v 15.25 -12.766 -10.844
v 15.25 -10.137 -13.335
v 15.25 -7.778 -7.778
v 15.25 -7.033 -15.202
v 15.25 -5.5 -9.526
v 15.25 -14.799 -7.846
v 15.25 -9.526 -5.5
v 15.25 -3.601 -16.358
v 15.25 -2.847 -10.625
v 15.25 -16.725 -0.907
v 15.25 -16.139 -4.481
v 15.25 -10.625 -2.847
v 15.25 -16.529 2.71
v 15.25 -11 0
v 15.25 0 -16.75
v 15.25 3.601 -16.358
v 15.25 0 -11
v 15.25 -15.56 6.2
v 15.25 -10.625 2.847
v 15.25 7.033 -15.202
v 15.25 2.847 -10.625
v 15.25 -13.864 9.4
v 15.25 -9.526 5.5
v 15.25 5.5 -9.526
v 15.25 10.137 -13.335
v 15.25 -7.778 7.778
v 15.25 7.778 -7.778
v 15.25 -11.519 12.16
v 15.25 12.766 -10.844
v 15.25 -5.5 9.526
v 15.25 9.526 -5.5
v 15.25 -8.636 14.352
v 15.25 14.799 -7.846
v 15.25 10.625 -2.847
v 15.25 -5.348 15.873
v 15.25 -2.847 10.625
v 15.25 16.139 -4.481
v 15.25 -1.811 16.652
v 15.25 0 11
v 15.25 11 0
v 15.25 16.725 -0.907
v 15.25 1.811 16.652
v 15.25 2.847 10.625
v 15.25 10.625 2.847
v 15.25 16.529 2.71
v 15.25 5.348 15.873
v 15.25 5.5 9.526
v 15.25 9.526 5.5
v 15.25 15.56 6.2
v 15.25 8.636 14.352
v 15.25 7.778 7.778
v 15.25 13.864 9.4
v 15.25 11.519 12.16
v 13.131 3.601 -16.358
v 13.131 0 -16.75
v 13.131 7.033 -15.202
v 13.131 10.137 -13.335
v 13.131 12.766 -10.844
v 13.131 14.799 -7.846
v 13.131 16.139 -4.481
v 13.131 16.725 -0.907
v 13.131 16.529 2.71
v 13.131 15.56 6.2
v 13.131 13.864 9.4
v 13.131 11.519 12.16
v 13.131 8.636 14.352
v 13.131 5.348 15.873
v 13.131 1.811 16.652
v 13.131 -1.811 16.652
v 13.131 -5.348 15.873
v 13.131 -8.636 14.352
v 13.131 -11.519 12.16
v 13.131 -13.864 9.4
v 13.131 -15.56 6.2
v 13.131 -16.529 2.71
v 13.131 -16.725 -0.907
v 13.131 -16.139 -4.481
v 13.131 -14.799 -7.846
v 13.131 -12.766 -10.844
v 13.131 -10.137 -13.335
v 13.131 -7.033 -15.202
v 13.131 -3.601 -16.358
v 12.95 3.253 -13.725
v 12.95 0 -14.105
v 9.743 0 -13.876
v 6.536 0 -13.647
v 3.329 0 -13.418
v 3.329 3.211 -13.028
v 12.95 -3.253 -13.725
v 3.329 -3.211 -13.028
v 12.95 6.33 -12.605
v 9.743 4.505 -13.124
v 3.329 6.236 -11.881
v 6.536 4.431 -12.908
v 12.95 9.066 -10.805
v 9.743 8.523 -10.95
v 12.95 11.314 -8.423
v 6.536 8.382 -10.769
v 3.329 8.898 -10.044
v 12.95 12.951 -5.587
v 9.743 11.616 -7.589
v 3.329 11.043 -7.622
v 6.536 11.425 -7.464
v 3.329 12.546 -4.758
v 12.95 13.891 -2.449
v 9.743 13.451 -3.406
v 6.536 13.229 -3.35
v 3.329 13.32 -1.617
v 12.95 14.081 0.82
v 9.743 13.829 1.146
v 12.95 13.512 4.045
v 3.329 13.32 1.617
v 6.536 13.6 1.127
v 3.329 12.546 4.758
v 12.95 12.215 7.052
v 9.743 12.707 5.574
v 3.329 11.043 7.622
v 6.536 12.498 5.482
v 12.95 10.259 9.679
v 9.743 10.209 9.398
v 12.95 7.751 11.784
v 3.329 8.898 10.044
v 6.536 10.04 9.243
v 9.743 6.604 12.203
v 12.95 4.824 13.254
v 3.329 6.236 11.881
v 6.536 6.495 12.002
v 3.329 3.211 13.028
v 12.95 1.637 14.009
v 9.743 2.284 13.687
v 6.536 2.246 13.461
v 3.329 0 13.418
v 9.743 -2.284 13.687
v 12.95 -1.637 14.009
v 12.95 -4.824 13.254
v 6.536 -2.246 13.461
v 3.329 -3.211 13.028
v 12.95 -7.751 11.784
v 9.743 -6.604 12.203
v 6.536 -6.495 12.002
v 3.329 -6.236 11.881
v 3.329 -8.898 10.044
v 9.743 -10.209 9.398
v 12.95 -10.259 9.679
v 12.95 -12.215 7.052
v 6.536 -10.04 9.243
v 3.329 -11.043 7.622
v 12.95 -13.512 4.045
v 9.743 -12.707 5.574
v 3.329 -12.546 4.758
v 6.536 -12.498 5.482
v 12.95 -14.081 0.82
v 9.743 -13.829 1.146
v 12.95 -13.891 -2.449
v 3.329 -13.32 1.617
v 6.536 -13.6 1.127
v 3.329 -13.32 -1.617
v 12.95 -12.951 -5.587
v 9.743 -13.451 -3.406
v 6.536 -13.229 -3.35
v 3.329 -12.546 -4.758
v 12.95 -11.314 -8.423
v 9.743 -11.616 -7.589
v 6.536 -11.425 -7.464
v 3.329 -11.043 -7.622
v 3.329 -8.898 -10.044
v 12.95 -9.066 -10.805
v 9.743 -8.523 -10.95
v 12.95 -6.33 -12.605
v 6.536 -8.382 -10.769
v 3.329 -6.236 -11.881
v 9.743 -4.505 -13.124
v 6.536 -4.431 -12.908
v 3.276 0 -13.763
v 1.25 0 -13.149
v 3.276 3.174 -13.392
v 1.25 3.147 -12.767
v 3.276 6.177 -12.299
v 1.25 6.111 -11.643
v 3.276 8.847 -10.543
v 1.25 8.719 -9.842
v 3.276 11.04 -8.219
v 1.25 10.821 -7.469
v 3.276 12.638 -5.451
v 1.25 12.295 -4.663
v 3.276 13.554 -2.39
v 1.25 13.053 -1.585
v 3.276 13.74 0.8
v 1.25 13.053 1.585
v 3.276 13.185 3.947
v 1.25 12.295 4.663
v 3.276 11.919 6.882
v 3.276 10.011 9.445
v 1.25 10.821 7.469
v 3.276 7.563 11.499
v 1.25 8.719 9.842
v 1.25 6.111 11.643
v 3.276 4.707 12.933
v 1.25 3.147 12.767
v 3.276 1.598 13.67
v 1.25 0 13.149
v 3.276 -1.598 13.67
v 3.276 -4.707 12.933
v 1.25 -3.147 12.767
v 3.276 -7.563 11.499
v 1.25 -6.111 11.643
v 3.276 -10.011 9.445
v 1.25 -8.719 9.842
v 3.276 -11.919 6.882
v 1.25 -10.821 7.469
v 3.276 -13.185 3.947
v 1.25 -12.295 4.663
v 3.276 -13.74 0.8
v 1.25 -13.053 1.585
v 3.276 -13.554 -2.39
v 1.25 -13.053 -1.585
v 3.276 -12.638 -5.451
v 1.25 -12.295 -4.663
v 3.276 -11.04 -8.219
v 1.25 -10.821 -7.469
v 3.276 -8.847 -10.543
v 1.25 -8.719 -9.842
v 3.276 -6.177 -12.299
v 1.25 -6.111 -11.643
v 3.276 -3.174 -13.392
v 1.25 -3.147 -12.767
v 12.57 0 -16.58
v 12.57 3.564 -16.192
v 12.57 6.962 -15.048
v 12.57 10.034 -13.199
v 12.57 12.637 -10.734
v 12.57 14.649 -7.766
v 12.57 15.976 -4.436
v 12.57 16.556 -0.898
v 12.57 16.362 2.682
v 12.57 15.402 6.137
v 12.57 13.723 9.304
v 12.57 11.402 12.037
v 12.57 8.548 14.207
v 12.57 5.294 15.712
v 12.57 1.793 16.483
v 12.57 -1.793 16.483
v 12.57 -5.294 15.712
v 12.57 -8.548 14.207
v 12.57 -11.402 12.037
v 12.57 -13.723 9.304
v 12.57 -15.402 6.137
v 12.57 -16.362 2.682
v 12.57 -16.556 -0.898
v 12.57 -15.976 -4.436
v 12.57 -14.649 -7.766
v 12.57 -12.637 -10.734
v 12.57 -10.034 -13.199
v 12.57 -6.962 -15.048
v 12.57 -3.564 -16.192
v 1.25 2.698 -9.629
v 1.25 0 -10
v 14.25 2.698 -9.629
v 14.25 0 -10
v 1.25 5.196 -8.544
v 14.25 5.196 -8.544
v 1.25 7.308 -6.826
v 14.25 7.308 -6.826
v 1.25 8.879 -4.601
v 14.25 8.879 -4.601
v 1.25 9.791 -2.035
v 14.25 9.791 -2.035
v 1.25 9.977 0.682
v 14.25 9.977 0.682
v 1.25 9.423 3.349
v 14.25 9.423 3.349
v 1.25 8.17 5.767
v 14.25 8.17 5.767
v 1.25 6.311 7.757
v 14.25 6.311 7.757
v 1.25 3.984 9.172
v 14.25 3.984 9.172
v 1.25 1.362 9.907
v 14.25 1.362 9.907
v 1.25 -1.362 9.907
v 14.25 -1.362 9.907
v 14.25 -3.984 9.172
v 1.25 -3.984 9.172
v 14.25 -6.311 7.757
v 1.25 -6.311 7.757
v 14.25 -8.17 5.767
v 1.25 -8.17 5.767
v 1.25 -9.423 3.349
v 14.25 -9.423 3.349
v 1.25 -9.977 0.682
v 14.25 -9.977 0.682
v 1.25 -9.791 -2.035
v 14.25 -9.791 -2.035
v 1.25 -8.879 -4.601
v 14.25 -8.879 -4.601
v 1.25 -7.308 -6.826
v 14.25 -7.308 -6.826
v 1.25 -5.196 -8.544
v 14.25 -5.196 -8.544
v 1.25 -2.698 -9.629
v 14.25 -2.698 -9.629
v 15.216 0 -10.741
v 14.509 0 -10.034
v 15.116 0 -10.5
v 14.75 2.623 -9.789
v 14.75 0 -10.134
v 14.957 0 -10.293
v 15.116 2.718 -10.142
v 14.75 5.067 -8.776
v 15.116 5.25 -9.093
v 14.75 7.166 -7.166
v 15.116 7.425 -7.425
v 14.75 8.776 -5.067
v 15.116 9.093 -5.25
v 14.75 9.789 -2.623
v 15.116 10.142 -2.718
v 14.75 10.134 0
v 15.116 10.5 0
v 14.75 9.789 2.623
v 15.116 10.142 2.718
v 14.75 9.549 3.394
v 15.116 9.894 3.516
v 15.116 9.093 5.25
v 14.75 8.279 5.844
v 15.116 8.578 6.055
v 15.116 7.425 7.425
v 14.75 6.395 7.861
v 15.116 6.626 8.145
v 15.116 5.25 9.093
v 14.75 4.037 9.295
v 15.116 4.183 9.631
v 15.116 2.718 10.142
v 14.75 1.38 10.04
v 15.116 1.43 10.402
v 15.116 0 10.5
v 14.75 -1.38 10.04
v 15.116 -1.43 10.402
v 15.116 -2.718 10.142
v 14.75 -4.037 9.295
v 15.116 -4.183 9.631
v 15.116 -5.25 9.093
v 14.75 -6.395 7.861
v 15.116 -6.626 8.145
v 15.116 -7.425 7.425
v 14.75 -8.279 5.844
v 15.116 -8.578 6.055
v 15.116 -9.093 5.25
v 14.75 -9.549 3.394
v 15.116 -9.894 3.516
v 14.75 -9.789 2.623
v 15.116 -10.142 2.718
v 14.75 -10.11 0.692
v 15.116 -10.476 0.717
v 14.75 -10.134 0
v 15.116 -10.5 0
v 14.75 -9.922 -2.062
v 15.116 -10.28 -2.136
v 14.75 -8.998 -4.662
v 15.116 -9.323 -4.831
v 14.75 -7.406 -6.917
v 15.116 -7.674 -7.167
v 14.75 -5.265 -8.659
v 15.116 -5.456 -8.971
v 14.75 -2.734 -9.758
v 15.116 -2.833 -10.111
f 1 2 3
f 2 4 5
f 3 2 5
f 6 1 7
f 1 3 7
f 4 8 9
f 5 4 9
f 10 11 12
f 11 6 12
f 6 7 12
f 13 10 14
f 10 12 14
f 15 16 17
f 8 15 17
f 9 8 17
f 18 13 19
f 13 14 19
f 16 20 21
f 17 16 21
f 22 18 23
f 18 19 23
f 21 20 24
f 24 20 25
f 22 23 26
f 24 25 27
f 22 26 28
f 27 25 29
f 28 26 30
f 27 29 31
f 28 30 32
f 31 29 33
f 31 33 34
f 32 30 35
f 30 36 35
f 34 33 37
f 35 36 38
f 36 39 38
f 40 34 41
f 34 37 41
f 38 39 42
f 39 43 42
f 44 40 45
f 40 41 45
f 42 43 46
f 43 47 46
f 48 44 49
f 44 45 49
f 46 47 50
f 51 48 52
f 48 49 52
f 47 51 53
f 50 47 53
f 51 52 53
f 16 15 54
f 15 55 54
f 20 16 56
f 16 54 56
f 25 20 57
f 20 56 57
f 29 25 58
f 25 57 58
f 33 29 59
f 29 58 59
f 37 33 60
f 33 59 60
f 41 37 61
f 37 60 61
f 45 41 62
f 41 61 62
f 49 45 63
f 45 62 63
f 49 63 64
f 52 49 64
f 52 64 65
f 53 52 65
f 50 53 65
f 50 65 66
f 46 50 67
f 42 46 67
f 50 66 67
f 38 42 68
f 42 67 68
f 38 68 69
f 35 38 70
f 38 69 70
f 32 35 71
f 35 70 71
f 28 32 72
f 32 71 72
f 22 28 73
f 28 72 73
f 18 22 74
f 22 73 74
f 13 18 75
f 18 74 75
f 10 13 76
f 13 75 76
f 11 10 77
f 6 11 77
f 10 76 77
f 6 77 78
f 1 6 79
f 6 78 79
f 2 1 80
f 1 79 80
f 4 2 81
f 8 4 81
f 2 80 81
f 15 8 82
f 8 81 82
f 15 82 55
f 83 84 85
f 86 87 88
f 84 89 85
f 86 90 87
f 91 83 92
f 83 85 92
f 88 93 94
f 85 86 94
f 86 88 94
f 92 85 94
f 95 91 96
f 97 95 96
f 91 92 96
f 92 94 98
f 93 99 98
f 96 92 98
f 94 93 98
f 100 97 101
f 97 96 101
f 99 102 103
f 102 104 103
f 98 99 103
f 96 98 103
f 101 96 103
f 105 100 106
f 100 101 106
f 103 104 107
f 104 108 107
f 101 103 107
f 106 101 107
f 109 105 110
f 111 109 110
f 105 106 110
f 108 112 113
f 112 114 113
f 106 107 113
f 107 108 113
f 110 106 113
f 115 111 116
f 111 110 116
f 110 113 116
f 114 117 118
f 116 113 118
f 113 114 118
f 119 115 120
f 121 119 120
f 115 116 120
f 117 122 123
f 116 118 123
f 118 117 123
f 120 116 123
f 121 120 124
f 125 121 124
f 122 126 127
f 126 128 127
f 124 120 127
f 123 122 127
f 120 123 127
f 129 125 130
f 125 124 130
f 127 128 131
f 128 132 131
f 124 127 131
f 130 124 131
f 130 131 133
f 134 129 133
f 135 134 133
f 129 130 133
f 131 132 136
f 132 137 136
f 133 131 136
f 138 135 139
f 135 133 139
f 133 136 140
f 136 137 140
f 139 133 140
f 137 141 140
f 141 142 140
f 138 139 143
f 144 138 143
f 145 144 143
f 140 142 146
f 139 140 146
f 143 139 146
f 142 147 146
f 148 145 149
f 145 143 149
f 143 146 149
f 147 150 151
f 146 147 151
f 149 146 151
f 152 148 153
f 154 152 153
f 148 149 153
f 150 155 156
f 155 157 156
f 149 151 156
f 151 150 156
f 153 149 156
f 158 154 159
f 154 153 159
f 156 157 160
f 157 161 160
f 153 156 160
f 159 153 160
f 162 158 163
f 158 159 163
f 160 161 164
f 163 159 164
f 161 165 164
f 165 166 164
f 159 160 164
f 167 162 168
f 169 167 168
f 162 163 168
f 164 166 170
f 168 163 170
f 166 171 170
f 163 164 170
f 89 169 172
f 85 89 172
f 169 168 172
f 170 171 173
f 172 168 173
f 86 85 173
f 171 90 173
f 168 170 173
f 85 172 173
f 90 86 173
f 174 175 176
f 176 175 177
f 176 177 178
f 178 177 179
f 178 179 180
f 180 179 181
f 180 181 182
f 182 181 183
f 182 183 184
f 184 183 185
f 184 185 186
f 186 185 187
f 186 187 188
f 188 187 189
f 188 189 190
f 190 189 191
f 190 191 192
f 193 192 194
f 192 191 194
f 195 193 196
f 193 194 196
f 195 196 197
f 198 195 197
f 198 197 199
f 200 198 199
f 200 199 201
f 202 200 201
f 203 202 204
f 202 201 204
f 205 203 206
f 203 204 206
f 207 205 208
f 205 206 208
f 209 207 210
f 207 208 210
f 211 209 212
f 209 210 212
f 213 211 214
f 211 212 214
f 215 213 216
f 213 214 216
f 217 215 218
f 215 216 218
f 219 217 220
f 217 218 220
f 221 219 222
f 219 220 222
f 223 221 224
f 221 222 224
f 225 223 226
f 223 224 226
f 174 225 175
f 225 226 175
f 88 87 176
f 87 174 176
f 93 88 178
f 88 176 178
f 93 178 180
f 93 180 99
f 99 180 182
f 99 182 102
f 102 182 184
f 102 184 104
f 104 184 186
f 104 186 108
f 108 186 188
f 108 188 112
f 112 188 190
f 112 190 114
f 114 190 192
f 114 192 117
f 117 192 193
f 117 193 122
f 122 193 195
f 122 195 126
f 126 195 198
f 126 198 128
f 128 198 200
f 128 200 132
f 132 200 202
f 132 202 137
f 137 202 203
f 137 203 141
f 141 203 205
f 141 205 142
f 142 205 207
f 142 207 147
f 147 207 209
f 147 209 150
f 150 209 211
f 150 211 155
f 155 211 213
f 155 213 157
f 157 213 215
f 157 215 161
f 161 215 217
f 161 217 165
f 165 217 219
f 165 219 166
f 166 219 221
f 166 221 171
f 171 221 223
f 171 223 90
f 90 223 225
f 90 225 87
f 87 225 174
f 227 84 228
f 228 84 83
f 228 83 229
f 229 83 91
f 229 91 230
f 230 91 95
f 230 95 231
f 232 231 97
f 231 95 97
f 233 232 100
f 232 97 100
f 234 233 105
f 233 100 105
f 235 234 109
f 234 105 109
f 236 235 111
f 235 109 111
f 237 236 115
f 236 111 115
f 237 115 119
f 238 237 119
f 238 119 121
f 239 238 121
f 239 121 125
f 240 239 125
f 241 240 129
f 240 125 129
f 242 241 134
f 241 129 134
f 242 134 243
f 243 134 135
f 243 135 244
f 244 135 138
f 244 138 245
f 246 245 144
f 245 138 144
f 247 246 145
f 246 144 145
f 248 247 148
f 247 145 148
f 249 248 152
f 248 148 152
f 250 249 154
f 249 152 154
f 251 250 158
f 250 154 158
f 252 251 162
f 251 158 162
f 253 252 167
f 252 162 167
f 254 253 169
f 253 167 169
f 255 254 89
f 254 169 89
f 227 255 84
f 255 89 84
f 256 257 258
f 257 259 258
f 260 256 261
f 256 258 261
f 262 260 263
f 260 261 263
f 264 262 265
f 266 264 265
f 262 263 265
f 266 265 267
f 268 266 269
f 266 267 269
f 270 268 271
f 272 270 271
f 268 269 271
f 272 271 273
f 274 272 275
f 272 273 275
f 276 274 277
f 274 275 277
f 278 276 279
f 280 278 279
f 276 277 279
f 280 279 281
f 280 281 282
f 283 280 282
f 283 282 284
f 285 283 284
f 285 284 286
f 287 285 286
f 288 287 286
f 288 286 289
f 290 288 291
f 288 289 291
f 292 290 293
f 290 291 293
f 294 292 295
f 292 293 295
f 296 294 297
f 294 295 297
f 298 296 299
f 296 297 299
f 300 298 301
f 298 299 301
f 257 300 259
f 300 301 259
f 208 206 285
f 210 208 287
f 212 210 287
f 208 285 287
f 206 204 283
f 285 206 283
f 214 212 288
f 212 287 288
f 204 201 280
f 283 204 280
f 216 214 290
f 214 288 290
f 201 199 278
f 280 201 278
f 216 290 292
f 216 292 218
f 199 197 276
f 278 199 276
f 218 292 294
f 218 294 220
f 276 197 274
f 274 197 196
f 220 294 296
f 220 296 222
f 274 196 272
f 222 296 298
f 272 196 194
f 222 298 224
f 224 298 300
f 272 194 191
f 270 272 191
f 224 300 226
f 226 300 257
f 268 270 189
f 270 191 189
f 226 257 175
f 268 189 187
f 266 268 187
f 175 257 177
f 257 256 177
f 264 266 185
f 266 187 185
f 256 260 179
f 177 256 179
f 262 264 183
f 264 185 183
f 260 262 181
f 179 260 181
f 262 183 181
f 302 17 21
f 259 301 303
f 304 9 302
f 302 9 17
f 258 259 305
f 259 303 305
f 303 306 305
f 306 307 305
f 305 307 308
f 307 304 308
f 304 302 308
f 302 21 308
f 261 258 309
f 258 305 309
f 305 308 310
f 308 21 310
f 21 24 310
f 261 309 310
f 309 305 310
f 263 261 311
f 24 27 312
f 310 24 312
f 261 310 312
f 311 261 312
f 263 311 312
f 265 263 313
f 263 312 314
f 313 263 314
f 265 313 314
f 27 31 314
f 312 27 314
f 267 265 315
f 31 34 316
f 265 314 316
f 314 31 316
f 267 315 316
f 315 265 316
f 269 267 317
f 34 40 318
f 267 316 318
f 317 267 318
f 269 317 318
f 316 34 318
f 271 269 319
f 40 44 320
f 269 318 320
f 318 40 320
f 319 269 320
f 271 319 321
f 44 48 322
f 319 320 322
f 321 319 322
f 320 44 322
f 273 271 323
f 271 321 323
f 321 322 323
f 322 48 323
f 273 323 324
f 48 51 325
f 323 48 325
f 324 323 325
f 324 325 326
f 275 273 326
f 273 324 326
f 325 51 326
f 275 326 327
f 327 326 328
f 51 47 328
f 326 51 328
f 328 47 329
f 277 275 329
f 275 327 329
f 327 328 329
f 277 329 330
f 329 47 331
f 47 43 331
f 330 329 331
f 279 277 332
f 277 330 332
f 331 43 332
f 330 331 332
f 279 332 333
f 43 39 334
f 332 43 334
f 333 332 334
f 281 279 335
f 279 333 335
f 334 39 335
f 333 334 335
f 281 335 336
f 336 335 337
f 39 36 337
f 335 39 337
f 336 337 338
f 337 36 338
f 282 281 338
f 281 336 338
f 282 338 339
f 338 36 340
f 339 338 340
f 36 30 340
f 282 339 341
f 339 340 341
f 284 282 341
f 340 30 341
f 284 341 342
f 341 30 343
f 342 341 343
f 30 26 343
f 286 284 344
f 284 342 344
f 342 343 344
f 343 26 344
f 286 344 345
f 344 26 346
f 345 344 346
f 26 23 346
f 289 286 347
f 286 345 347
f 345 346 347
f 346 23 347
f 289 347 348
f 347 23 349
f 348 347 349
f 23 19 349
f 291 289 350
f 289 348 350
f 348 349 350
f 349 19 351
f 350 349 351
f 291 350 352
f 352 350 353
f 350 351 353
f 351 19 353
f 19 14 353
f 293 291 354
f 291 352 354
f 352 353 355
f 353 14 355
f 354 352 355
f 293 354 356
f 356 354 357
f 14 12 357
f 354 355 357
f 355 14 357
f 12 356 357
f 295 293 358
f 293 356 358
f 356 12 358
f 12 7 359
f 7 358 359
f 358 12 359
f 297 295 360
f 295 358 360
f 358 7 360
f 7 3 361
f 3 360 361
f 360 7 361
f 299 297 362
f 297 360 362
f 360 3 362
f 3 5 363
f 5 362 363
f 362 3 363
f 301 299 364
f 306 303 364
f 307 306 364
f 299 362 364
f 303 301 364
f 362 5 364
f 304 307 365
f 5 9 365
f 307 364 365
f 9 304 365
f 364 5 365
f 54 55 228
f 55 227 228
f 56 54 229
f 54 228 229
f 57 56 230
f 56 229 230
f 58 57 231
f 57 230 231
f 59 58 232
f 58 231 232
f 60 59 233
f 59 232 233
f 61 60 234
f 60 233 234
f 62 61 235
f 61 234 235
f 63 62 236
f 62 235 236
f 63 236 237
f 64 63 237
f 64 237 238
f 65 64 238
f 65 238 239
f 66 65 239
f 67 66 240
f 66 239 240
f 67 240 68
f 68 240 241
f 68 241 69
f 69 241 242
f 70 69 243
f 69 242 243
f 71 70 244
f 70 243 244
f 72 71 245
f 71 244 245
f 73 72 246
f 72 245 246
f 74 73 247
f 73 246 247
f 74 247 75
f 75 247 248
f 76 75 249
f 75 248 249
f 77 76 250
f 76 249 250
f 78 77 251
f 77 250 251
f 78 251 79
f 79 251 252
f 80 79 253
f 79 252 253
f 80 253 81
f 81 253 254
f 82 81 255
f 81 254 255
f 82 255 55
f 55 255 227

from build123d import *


with BuildPart() as part:
    # ｽｹｯﾁ1 → 回転1 (revolve)
    with BuildSketch(Plane.XY, mode=Mode.PRIVATE) as revolve_1_sk:
        with BuildLine():
            Line((1.25, 13.149), (1.25, 10))
            Line((1.25, 10), (14.25, 10))
            ThreePointArc((14.25, 10), (14.957106781, 10.292893219), (15.25, 11))
            Line((15.25, 11), (15.25, 16.75))
            Line((15.25, 16.75), (13.131049, 16.75))
            Line((13.131049, 16.75), (12.570253493, 16.580029771))
            Line((12.570253493, 16.580029771), (12.9498679, 14.104804989))
            Line((12.9498679, 14.104804989), (3.329373052, 13.418096908))
            Line((3.329373052, 13.418096908), (3.276447429, 13.763191322))
            Line((3.276447429, 13.763191322), (1.25, 13.149))
        make_face()
    revolve(revolve_1_sk.sketch.rotate(Axis((1.25, 0, 0), (1, 0, 0)), 270), axis=Axis((1.25, 0, 0), (1, 0, 0)))


solid = part.part
